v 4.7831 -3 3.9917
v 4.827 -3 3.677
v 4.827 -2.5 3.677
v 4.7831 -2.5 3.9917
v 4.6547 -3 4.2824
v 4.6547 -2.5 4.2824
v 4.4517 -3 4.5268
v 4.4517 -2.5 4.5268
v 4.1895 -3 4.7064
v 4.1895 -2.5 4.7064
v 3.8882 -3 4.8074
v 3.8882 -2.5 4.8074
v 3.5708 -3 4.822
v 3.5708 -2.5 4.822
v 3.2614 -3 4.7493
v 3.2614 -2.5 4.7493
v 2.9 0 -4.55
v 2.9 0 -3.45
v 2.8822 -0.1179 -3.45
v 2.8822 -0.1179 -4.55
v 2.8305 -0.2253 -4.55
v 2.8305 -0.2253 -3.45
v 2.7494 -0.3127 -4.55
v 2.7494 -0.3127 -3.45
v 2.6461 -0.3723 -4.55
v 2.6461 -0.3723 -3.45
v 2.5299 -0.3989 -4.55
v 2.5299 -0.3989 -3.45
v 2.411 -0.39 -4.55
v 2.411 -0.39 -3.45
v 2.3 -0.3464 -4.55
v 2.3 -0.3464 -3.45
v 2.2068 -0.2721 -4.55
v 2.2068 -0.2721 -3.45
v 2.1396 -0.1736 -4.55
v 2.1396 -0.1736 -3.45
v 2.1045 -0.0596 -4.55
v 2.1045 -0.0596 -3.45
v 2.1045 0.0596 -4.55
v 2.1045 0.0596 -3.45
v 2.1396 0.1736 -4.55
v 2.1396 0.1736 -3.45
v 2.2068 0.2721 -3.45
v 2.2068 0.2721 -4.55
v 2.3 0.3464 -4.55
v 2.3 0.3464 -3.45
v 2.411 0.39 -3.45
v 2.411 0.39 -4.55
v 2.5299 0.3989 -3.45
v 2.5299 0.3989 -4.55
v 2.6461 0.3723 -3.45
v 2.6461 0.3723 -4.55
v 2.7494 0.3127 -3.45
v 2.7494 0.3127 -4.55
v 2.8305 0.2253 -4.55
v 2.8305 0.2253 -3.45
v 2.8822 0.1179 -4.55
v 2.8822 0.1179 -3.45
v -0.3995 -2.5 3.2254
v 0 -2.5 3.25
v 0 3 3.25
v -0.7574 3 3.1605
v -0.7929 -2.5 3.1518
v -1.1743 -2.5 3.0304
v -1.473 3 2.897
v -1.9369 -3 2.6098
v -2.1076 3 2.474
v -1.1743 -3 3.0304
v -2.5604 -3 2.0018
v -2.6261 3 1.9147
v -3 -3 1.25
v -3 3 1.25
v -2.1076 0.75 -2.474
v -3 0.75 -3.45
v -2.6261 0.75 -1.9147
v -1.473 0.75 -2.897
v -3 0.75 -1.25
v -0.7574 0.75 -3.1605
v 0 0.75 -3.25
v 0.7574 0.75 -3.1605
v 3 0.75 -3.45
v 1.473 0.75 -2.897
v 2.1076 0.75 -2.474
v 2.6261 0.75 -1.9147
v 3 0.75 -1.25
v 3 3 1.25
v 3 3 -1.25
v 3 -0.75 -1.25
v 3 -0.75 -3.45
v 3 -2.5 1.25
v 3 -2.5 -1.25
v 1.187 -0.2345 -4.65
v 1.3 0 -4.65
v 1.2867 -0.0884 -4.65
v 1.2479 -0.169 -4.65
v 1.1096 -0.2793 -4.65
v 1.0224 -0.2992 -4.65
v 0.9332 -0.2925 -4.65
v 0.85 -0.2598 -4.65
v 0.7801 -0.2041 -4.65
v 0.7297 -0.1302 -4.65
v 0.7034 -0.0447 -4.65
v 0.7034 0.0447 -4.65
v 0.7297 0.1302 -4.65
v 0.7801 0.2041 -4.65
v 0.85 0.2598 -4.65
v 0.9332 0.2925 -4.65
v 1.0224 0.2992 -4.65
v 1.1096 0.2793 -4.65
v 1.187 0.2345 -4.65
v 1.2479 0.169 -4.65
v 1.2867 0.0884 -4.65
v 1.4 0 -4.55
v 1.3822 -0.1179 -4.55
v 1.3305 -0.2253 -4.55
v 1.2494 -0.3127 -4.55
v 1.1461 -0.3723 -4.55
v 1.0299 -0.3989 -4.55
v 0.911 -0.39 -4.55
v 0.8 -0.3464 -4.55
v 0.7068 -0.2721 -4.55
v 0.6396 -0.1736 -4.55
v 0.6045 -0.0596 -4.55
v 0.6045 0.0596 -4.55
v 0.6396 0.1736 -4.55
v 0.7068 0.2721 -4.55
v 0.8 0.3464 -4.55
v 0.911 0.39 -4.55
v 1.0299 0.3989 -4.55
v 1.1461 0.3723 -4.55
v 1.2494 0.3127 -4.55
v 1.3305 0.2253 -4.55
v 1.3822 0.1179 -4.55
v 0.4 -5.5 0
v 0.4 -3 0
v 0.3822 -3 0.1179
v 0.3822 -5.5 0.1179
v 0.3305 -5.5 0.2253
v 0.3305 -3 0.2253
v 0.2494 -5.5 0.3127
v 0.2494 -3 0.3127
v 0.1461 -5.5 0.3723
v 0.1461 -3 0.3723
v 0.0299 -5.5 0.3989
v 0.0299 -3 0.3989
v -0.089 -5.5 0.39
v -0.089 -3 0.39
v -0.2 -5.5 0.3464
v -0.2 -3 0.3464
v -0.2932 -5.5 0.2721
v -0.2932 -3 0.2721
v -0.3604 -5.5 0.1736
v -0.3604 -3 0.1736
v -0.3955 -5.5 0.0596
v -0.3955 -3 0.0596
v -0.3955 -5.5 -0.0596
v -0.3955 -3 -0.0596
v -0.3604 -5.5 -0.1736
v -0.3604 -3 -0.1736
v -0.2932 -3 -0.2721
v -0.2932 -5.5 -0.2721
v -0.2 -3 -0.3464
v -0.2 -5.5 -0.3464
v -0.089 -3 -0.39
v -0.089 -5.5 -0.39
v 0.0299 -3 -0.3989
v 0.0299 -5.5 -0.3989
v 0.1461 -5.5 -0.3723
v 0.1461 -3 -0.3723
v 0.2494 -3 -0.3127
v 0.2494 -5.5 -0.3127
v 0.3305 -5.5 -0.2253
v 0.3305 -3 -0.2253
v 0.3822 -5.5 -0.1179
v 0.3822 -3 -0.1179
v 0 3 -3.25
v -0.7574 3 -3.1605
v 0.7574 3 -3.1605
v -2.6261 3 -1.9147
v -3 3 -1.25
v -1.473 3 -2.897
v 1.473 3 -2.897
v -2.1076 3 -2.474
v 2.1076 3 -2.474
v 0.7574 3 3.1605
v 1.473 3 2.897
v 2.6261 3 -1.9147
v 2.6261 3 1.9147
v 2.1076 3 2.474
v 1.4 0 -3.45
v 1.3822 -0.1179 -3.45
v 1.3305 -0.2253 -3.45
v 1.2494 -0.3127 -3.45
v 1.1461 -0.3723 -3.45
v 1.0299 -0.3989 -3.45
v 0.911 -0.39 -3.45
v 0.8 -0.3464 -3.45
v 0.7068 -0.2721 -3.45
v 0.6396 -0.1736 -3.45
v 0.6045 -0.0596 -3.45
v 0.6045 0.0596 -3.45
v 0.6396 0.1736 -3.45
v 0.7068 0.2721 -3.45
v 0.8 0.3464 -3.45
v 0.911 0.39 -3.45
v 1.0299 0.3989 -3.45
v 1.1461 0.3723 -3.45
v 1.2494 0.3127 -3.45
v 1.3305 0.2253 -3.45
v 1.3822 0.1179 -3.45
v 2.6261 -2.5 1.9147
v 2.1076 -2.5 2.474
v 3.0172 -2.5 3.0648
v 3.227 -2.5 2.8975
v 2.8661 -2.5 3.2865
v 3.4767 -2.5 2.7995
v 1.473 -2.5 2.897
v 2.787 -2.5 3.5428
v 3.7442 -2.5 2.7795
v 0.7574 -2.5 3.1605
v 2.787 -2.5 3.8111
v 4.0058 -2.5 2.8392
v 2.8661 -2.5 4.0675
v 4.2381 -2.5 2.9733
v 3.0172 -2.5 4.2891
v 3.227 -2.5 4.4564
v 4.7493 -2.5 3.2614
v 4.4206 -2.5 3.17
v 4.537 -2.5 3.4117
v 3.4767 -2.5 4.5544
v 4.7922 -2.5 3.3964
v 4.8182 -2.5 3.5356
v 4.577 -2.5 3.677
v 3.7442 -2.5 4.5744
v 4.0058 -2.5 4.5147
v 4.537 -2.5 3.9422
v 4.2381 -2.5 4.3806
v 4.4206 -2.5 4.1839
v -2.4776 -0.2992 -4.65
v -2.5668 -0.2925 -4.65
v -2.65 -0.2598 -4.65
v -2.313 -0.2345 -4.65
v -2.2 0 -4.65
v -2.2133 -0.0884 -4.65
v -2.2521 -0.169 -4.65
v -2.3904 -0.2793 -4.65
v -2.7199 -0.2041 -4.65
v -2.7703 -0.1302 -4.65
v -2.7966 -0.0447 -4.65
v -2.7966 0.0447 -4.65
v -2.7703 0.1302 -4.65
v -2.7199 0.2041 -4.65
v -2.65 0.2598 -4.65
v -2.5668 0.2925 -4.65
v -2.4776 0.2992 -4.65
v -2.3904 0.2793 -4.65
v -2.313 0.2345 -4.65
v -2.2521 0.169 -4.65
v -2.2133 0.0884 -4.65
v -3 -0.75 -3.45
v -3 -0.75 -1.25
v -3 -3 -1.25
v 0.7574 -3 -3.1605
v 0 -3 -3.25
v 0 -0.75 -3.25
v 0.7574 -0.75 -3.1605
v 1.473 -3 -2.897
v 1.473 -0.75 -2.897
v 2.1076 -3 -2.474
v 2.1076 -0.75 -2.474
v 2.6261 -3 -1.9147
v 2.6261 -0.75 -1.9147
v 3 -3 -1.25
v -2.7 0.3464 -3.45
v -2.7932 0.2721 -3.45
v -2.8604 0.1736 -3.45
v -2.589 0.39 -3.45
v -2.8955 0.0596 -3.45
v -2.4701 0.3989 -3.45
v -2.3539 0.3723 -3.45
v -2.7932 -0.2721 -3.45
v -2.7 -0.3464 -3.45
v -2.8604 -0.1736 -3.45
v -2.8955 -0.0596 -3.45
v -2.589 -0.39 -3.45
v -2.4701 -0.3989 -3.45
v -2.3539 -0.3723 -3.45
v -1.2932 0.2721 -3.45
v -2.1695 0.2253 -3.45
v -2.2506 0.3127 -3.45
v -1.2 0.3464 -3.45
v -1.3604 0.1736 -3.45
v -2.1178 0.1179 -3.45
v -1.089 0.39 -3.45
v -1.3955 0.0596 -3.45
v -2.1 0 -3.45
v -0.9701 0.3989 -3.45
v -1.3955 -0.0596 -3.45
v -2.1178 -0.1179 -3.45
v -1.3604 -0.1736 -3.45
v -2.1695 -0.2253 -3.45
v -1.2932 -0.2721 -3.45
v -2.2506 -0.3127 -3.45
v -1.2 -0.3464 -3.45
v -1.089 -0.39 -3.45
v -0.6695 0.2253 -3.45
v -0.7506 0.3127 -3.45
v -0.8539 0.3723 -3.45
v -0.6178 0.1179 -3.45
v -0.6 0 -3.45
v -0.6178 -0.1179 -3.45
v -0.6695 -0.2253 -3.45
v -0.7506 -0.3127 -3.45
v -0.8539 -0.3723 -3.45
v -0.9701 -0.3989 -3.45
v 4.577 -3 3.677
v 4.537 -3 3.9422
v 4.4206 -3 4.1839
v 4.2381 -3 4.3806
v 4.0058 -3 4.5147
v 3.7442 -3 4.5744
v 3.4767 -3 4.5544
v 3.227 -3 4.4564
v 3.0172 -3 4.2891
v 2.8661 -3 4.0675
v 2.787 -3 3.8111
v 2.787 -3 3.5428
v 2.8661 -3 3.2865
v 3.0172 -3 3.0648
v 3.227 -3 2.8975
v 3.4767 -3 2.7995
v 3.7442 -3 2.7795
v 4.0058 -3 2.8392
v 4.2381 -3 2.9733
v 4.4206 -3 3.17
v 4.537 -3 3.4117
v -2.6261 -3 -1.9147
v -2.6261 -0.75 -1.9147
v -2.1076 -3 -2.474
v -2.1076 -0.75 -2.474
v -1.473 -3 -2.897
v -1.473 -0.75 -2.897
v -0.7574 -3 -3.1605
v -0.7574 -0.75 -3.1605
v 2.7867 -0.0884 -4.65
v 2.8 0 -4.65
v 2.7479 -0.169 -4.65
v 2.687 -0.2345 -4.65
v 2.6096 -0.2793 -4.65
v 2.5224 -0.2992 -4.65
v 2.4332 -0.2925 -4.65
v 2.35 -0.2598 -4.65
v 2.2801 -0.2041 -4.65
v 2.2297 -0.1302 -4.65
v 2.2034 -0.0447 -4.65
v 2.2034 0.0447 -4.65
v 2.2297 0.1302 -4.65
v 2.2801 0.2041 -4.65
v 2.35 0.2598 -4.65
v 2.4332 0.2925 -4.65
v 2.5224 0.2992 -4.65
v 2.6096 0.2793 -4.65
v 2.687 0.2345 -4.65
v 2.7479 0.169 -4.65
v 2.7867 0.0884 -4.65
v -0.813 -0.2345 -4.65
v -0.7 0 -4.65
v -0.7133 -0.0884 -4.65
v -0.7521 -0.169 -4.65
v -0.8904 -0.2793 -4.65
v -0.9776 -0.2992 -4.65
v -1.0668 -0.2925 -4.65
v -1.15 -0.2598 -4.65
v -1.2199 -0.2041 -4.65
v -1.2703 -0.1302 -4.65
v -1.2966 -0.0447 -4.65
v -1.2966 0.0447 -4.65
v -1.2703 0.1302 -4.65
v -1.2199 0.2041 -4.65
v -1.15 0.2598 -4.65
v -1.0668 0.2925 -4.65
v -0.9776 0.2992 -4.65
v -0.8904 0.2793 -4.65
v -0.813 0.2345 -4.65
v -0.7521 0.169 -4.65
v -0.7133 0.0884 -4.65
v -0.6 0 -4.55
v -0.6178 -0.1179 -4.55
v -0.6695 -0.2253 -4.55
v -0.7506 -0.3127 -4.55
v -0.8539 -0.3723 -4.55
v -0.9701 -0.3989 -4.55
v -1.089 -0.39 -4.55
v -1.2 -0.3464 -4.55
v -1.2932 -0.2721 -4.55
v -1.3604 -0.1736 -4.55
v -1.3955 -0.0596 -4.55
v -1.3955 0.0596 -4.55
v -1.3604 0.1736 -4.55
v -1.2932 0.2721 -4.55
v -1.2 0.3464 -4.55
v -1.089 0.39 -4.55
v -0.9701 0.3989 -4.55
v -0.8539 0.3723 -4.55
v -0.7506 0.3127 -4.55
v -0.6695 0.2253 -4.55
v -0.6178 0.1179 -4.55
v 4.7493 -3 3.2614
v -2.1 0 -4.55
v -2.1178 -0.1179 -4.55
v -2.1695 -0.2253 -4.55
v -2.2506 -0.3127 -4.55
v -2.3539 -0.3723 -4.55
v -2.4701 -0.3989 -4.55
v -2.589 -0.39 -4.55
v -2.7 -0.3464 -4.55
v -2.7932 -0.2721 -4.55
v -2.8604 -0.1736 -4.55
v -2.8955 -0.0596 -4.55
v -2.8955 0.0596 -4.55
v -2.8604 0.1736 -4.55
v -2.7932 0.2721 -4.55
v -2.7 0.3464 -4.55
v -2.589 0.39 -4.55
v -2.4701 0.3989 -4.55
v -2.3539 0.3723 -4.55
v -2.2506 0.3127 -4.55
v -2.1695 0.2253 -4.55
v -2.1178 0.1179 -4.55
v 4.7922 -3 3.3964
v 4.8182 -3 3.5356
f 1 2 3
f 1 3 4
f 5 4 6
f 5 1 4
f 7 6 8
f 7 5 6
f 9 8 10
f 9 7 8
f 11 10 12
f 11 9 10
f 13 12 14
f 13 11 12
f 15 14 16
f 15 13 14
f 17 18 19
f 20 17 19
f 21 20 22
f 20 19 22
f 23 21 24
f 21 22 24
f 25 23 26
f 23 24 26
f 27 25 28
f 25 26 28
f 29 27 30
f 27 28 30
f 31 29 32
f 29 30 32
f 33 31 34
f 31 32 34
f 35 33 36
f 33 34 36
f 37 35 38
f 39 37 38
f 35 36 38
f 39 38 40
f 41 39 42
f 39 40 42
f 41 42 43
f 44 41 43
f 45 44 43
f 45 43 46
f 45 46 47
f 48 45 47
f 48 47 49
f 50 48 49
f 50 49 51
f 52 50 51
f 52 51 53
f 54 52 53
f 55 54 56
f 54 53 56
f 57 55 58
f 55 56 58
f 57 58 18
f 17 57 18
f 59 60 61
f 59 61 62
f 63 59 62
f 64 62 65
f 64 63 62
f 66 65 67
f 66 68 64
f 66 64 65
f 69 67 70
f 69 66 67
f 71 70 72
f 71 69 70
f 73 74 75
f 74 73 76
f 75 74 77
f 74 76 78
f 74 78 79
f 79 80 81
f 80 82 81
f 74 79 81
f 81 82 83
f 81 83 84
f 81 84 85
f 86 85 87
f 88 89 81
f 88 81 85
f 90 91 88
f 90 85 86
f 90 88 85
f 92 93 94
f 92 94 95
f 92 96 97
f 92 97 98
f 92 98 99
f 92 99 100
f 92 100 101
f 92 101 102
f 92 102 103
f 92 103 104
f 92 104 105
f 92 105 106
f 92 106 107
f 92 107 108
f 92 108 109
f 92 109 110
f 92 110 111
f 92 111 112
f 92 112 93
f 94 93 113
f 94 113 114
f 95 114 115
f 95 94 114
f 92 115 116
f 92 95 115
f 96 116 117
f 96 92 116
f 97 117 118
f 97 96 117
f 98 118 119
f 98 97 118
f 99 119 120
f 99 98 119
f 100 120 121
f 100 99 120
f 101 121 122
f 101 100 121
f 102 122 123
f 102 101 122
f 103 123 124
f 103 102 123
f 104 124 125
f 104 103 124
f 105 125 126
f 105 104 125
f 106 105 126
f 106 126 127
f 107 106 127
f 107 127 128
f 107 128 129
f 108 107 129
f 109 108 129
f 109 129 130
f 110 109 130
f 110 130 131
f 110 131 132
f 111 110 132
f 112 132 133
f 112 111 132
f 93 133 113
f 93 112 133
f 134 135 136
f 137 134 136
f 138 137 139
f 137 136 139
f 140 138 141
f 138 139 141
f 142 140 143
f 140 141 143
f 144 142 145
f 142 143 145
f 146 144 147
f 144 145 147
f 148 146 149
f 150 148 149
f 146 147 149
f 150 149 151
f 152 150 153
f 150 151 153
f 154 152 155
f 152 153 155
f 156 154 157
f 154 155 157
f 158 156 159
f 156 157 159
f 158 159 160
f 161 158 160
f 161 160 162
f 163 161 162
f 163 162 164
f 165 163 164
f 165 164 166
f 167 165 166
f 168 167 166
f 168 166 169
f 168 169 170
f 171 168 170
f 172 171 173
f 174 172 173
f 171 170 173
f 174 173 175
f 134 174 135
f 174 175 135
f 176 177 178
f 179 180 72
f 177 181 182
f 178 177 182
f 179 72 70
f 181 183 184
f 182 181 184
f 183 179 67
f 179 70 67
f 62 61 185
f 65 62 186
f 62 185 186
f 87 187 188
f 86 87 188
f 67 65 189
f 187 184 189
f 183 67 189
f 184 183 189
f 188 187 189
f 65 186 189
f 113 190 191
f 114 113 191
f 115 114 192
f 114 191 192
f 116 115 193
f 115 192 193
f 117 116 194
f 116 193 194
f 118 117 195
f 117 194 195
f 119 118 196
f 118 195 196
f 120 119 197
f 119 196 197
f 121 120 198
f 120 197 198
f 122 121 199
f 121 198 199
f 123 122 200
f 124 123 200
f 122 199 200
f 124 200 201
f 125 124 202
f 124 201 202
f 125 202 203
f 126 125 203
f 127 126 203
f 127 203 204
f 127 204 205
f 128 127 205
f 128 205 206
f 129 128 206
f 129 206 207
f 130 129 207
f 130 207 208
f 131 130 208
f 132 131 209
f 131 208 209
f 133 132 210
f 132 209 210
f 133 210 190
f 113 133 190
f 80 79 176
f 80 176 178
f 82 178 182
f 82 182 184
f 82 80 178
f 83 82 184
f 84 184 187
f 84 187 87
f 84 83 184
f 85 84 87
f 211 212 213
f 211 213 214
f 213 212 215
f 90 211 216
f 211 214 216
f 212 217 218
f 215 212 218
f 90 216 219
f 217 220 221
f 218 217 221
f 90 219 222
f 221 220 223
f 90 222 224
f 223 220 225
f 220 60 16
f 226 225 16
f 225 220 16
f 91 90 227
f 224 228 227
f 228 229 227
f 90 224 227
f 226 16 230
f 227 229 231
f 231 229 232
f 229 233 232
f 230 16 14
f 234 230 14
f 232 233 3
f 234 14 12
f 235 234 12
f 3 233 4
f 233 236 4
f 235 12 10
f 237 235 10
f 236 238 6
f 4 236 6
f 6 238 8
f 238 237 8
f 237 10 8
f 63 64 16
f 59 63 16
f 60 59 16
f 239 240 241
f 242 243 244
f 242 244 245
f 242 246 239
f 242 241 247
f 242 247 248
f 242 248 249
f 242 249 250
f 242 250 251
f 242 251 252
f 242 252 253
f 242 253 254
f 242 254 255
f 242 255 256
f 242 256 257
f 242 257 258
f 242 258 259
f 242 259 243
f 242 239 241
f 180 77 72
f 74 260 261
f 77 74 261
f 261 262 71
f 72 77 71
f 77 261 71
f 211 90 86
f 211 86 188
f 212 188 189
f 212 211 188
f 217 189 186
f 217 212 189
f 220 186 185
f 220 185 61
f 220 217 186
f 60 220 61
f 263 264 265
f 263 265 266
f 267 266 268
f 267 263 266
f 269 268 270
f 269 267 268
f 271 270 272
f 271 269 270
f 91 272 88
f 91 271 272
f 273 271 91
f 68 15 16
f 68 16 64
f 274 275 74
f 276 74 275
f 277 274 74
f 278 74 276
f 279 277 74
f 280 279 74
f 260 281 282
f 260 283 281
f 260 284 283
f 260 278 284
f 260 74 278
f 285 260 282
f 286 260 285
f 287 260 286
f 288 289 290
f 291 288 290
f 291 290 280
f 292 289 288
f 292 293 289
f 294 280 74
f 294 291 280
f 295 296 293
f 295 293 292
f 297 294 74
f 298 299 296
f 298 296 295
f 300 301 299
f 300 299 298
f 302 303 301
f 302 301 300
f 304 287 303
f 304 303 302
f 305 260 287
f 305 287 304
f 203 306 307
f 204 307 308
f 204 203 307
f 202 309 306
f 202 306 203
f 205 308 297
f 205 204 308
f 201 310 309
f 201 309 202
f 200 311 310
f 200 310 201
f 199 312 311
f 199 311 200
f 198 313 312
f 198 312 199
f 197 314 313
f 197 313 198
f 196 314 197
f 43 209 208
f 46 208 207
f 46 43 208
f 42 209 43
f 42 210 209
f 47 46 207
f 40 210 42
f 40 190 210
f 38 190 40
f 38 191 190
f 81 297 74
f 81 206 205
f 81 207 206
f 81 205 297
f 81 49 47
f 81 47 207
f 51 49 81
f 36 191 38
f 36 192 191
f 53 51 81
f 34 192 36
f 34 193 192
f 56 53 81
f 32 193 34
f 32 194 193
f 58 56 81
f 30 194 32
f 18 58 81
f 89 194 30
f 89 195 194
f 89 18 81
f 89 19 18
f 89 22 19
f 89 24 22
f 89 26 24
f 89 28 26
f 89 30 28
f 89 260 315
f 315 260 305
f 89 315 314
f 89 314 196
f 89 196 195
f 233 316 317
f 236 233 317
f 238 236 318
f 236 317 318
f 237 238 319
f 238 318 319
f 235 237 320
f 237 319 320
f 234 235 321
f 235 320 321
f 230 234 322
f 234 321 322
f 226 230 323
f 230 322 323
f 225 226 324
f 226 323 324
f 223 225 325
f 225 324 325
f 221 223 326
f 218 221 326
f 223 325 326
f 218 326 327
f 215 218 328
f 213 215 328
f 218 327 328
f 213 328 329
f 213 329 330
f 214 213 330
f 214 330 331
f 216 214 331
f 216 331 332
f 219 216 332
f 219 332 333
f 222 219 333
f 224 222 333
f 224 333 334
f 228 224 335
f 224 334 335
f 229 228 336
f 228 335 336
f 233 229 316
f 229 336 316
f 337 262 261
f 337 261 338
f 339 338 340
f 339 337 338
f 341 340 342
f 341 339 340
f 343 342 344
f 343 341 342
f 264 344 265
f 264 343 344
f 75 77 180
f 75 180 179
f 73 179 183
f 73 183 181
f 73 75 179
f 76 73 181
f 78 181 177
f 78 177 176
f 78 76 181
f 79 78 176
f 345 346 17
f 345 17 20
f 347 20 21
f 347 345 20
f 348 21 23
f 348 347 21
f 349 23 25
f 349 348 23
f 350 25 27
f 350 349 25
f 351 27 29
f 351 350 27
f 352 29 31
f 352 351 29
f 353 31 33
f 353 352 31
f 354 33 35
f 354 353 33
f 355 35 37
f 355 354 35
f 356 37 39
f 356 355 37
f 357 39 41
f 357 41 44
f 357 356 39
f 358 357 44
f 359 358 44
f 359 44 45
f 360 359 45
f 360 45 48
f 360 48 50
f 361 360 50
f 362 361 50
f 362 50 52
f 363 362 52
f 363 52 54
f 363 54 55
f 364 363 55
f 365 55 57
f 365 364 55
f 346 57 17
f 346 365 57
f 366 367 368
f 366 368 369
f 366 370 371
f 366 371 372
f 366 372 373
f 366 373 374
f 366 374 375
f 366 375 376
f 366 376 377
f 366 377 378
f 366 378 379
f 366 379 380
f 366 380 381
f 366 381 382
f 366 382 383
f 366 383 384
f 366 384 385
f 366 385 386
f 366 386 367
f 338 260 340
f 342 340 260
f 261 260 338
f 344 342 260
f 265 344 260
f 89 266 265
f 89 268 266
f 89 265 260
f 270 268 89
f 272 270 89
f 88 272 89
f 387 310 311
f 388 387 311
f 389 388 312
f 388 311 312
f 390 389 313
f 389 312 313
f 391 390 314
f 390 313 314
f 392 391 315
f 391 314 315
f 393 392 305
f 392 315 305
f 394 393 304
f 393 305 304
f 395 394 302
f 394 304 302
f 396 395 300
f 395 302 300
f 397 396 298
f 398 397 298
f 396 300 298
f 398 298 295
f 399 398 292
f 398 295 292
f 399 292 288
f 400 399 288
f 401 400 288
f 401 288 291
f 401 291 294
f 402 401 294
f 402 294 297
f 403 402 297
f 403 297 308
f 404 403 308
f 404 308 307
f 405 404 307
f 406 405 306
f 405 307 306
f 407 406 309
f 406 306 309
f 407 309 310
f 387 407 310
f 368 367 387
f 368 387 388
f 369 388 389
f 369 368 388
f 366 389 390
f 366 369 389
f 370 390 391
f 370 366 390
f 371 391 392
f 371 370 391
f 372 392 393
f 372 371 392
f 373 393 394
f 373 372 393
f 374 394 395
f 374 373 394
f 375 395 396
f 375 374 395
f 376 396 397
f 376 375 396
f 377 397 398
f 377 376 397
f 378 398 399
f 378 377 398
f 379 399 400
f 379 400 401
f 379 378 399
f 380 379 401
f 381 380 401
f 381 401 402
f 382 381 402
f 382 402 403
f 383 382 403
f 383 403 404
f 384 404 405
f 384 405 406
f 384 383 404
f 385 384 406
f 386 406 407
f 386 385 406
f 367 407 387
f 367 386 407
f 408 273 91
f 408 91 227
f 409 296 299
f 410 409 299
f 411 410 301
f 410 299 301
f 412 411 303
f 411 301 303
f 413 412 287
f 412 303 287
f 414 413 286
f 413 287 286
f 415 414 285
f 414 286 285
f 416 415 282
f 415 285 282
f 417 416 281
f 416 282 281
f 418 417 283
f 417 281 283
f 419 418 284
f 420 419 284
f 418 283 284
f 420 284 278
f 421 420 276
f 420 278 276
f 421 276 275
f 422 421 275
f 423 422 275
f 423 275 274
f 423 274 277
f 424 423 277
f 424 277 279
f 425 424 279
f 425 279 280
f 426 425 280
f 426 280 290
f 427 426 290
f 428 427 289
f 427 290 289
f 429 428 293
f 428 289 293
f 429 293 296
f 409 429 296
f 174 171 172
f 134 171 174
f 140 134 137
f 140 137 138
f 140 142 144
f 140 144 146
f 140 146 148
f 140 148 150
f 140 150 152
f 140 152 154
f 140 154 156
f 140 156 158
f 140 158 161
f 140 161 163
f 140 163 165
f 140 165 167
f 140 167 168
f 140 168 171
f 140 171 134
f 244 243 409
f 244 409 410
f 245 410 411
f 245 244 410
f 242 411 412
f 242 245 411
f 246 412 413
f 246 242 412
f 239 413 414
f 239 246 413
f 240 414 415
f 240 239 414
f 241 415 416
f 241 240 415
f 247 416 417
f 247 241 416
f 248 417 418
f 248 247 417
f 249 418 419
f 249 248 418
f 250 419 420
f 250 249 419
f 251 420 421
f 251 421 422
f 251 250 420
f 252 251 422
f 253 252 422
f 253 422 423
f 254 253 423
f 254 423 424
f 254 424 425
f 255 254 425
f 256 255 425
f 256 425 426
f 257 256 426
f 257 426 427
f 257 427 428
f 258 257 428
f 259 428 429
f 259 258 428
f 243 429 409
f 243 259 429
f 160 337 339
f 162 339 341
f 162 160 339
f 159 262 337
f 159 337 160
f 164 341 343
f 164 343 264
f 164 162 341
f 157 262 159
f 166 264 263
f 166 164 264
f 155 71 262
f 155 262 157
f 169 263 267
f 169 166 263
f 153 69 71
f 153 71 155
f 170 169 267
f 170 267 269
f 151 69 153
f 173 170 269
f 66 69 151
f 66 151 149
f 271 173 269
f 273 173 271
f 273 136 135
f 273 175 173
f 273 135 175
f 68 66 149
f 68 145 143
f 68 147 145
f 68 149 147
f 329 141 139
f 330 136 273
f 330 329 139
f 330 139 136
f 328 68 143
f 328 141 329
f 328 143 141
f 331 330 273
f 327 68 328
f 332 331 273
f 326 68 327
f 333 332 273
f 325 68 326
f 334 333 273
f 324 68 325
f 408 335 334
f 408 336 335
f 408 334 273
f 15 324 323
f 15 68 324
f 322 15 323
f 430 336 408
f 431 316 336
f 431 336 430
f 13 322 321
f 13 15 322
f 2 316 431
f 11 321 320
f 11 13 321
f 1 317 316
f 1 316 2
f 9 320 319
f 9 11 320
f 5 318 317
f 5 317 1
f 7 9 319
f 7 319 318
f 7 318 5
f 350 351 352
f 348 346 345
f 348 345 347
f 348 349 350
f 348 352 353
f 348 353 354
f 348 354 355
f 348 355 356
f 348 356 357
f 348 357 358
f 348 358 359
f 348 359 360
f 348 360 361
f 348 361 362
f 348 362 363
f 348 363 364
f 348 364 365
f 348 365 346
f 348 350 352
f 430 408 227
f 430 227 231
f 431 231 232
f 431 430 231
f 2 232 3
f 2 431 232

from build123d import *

# Parameters (mm, degrees)
F1_DEPTH  = 6
F2_R      = 0.4
F3_DEPTH  = 2.5
F4_R      = 0.9
F5_DEPTH  = 0.5
F7_W      = 6
F7_H      = 2.2
F8_DEPTH  = 0.75
F9_R      = 0.4
F10_DEPTH = 1.2
F11_SIZE  = 0.1


with BuildPart() as f1:
    # F0 (on Front) → F1 (new body)
    with BuildSketch(Plane.XZ):
        with BuildLine():
            ThreePointArc((3, 1.25), (1.8027756377, 2.7041634566), (0, 3.25))
            ThreePointArc((0, 3.25), (-1.8027756377, 2.7041634566), (-3, 1.25))
            Line((-3, 1.25), (-3, -1.25))
            ThreePointArc((-3, -1.25), (-1.8027756377, -2.7041634566), (0, -3.25))
            ThreePointArc((0, -3.25), (1.8027756377, -2.7041634566), (3, -1.25))
            Line((3, -1.25), (3, 1.25))
        make_face()
    extrude(amount=-F1_DEPTH)

    # F2 (on face) → F3 (join)
    with BuildSketch(Plane.XZ):
        Circle(F2_R)
    extrude(amount=F3_DEPTH)

    # F4 (on face) → F5 (join)
    with BuildSketch(Plane.XZ):
        with BuildLine():
            ThreePointArc((4.7492643315, 3.2614396069), (2.8637824638, 2.8637824638), (3.2614396069, 4.7492643315))
            Line((3.2614396069, 4.7492643315), (-1.1742833736, 3.0304386743))
            ThreePointArc((-1.1742833736, 3.0304386743), (1.2750689268, 2.9894312556), (3, 1.25))
            Line((3, 1.25), (3, -1.25))
            Line((3, -1.25), (4.7492643315, 3.2614396069))
        make_face()
        with BuildLine():
            ThreePointArc((4.7492643315, 3.2614396069), (4.8073656809, 3.4655970706), (4.8269552622, 3.6769552622))
            ThreePointArc((4.8269552622, 3.6769552622), (4.3268233243, 4.6257289453), (3.2614396069, 4.7492643315))
            ThreePointArc((3.2614396069, 4.7492643315), (2.8637824638, 2.8637824638), (4.7492643315, 3.2614396069))
        make_face()
        with Locations((3.6769552622, 3.6769552622)):
            Circle(F4_R, mode=Mode.SUBTRACT)
    extrude(amount=-F5_DEPTH)


with BuildPart() as f1_1:
    # F6: moved
    add(f1.part.moved(Location((0, -3, 0))))

    # F7 (on Front) → F8 (join, symmetric)
    with BuildSketch(Plane.XZ):
        with Locations((0, -2.35)):
            Rectangle(F7_W, F7_H)
    extrude(amount=F8_DEPTH, both=True)

    # F9 (on face) → F10 (join)
    with BuildSketch(Plane(origin=(0, 0, -3.45), x_dir=(1, 0, 0), z_dir=(0, 0, -1))):
        with Locations((-2.5, 0)):
            Circle(F9_R)
        with Locations((-1, 0)):
            Circle(F9_R)
        with Locations((1, 0)):
            Circle(F9_R)
        with Locations((2.5, 0)):
            Circle(F9_R)
    extrude(amount=F10_DEPTH)

    # F11
    f11_edges = [f1_1.edges().sort_by_distance(p)[0] for p in [
        (-2.9, 0, -4.65),
        (-1.4, 0, -4.65),
        (0.6, 0, -4.65),
        (2.1, 0, -4.65),
    ]]
    chamfer(f11_edges, length=F11_SIZE)


solid = f1_1.part
